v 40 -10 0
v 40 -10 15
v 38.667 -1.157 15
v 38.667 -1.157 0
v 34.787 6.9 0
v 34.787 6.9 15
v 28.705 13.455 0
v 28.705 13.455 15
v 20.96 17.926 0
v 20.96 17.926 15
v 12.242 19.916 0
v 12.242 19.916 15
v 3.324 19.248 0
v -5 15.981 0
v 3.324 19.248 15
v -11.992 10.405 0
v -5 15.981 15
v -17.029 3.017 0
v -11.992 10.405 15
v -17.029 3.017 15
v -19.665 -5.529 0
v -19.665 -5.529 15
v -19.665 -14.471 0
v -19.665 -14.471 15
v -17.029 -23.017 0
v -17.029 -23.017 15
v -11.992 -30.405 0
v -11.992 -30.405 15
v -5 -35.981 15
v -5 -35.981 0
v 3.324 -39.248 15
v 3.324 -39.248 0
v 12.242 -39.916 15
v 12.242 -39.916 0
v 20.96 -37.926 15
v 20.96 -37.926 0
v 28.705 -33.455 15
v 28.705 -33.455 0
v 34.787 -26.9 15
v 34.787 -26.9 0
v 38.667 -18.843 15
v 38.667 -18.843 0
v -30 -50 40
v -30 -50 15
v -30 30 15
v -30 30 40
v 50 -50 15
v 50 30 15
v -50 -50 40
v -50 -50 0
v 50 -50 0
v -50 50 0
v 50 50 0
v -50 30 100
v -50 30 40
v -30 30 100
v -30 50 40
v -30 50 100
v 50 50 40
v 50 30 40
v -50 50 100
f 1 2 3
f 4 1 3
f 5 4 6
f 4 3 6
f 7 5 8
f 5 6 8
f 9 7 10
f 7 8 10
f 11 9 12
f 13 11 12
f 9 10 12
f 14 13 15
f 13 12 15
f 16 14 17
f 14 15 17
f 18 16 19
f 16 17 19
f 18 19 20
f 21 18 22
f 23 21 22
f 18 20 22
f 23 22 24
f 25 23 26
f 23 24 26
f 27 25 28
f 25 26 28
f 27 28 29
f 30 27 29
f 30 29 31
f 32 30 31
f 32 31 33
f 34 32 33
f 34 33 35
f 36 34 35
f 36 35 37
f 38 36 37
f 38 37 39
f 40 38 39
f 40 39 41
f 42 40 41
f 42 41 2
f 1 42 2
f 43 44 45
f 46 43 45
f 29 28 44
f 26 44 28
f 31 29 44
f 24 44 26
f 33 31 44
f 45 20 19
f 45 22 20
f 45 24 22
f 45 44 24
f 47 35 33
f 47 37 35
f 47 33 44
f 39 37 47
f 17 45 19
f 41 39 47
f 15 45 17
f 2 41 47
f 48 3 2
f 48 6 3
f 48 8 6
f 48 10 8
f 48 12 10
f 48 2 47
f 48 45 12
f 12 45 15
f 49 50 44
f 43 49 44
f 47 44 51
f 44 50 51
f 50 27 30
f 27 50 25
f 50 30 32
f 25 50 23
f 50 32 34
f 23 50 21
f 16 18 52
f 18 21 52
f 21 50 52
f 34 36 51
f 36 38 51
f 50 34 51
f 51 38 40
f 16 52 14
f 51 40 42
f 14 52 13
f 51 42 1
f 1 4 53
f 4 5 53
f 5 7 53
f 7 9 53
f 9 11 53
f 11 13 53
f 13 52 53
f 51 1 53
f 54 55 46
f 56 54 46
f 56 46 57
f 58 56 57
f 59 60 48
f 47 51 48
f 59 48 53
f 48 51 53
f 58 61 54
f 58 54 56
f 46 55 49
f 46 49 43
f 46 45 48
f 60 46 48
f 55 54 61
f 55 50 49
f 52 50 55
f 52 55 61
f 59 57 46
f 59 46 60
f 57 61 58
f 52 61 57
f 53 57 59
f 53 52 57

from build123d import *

# Parameters (mm, degrees)
F0_W     = 100
F0_H     = 100
F1_DEPTH = 15
F3_DEPTH = 25
F4_R     = 30
F5_DEPTH = 15.001
F6_W     = 20
F6_H     = 20
F7_DEPTH = 60


with BuildPart() as f1:
    # F0 (on Top) → F1 (new body)
    with BuildSketch(Plane.XY):
        Rectangle(F0_W, F0_H)
    extrude(amount=F1_DEPTH)

    # F2 (on face) → F3 (join)
    with BuildSketch(Plane.XY.offset(15)):
        Polygon((-30, 30), (50, 30), (50, 50), (-50, 50), (-50, -50), (-30, -50), align=None)
    extrude(amount=F3_DEPTH)

    # F4 (on face) → F5 (cut, through all)
    with BuildSketch(Plane.XY.offset(15)):
        with Locations((10, -10)):
            Circle(F4_R)
    extrude(amount=-F5_DEPTH, mode=Mode.SUBTRACT)

    # F6 (on face) → F7 (join)
    with BuildSketch(Plane.XY.offset(40)):
        with Locations((-40, 40)):
            Rectangle(F6_W, F6_H)
    extrude(amount=F7_DEPTH)


solid = f1.part
